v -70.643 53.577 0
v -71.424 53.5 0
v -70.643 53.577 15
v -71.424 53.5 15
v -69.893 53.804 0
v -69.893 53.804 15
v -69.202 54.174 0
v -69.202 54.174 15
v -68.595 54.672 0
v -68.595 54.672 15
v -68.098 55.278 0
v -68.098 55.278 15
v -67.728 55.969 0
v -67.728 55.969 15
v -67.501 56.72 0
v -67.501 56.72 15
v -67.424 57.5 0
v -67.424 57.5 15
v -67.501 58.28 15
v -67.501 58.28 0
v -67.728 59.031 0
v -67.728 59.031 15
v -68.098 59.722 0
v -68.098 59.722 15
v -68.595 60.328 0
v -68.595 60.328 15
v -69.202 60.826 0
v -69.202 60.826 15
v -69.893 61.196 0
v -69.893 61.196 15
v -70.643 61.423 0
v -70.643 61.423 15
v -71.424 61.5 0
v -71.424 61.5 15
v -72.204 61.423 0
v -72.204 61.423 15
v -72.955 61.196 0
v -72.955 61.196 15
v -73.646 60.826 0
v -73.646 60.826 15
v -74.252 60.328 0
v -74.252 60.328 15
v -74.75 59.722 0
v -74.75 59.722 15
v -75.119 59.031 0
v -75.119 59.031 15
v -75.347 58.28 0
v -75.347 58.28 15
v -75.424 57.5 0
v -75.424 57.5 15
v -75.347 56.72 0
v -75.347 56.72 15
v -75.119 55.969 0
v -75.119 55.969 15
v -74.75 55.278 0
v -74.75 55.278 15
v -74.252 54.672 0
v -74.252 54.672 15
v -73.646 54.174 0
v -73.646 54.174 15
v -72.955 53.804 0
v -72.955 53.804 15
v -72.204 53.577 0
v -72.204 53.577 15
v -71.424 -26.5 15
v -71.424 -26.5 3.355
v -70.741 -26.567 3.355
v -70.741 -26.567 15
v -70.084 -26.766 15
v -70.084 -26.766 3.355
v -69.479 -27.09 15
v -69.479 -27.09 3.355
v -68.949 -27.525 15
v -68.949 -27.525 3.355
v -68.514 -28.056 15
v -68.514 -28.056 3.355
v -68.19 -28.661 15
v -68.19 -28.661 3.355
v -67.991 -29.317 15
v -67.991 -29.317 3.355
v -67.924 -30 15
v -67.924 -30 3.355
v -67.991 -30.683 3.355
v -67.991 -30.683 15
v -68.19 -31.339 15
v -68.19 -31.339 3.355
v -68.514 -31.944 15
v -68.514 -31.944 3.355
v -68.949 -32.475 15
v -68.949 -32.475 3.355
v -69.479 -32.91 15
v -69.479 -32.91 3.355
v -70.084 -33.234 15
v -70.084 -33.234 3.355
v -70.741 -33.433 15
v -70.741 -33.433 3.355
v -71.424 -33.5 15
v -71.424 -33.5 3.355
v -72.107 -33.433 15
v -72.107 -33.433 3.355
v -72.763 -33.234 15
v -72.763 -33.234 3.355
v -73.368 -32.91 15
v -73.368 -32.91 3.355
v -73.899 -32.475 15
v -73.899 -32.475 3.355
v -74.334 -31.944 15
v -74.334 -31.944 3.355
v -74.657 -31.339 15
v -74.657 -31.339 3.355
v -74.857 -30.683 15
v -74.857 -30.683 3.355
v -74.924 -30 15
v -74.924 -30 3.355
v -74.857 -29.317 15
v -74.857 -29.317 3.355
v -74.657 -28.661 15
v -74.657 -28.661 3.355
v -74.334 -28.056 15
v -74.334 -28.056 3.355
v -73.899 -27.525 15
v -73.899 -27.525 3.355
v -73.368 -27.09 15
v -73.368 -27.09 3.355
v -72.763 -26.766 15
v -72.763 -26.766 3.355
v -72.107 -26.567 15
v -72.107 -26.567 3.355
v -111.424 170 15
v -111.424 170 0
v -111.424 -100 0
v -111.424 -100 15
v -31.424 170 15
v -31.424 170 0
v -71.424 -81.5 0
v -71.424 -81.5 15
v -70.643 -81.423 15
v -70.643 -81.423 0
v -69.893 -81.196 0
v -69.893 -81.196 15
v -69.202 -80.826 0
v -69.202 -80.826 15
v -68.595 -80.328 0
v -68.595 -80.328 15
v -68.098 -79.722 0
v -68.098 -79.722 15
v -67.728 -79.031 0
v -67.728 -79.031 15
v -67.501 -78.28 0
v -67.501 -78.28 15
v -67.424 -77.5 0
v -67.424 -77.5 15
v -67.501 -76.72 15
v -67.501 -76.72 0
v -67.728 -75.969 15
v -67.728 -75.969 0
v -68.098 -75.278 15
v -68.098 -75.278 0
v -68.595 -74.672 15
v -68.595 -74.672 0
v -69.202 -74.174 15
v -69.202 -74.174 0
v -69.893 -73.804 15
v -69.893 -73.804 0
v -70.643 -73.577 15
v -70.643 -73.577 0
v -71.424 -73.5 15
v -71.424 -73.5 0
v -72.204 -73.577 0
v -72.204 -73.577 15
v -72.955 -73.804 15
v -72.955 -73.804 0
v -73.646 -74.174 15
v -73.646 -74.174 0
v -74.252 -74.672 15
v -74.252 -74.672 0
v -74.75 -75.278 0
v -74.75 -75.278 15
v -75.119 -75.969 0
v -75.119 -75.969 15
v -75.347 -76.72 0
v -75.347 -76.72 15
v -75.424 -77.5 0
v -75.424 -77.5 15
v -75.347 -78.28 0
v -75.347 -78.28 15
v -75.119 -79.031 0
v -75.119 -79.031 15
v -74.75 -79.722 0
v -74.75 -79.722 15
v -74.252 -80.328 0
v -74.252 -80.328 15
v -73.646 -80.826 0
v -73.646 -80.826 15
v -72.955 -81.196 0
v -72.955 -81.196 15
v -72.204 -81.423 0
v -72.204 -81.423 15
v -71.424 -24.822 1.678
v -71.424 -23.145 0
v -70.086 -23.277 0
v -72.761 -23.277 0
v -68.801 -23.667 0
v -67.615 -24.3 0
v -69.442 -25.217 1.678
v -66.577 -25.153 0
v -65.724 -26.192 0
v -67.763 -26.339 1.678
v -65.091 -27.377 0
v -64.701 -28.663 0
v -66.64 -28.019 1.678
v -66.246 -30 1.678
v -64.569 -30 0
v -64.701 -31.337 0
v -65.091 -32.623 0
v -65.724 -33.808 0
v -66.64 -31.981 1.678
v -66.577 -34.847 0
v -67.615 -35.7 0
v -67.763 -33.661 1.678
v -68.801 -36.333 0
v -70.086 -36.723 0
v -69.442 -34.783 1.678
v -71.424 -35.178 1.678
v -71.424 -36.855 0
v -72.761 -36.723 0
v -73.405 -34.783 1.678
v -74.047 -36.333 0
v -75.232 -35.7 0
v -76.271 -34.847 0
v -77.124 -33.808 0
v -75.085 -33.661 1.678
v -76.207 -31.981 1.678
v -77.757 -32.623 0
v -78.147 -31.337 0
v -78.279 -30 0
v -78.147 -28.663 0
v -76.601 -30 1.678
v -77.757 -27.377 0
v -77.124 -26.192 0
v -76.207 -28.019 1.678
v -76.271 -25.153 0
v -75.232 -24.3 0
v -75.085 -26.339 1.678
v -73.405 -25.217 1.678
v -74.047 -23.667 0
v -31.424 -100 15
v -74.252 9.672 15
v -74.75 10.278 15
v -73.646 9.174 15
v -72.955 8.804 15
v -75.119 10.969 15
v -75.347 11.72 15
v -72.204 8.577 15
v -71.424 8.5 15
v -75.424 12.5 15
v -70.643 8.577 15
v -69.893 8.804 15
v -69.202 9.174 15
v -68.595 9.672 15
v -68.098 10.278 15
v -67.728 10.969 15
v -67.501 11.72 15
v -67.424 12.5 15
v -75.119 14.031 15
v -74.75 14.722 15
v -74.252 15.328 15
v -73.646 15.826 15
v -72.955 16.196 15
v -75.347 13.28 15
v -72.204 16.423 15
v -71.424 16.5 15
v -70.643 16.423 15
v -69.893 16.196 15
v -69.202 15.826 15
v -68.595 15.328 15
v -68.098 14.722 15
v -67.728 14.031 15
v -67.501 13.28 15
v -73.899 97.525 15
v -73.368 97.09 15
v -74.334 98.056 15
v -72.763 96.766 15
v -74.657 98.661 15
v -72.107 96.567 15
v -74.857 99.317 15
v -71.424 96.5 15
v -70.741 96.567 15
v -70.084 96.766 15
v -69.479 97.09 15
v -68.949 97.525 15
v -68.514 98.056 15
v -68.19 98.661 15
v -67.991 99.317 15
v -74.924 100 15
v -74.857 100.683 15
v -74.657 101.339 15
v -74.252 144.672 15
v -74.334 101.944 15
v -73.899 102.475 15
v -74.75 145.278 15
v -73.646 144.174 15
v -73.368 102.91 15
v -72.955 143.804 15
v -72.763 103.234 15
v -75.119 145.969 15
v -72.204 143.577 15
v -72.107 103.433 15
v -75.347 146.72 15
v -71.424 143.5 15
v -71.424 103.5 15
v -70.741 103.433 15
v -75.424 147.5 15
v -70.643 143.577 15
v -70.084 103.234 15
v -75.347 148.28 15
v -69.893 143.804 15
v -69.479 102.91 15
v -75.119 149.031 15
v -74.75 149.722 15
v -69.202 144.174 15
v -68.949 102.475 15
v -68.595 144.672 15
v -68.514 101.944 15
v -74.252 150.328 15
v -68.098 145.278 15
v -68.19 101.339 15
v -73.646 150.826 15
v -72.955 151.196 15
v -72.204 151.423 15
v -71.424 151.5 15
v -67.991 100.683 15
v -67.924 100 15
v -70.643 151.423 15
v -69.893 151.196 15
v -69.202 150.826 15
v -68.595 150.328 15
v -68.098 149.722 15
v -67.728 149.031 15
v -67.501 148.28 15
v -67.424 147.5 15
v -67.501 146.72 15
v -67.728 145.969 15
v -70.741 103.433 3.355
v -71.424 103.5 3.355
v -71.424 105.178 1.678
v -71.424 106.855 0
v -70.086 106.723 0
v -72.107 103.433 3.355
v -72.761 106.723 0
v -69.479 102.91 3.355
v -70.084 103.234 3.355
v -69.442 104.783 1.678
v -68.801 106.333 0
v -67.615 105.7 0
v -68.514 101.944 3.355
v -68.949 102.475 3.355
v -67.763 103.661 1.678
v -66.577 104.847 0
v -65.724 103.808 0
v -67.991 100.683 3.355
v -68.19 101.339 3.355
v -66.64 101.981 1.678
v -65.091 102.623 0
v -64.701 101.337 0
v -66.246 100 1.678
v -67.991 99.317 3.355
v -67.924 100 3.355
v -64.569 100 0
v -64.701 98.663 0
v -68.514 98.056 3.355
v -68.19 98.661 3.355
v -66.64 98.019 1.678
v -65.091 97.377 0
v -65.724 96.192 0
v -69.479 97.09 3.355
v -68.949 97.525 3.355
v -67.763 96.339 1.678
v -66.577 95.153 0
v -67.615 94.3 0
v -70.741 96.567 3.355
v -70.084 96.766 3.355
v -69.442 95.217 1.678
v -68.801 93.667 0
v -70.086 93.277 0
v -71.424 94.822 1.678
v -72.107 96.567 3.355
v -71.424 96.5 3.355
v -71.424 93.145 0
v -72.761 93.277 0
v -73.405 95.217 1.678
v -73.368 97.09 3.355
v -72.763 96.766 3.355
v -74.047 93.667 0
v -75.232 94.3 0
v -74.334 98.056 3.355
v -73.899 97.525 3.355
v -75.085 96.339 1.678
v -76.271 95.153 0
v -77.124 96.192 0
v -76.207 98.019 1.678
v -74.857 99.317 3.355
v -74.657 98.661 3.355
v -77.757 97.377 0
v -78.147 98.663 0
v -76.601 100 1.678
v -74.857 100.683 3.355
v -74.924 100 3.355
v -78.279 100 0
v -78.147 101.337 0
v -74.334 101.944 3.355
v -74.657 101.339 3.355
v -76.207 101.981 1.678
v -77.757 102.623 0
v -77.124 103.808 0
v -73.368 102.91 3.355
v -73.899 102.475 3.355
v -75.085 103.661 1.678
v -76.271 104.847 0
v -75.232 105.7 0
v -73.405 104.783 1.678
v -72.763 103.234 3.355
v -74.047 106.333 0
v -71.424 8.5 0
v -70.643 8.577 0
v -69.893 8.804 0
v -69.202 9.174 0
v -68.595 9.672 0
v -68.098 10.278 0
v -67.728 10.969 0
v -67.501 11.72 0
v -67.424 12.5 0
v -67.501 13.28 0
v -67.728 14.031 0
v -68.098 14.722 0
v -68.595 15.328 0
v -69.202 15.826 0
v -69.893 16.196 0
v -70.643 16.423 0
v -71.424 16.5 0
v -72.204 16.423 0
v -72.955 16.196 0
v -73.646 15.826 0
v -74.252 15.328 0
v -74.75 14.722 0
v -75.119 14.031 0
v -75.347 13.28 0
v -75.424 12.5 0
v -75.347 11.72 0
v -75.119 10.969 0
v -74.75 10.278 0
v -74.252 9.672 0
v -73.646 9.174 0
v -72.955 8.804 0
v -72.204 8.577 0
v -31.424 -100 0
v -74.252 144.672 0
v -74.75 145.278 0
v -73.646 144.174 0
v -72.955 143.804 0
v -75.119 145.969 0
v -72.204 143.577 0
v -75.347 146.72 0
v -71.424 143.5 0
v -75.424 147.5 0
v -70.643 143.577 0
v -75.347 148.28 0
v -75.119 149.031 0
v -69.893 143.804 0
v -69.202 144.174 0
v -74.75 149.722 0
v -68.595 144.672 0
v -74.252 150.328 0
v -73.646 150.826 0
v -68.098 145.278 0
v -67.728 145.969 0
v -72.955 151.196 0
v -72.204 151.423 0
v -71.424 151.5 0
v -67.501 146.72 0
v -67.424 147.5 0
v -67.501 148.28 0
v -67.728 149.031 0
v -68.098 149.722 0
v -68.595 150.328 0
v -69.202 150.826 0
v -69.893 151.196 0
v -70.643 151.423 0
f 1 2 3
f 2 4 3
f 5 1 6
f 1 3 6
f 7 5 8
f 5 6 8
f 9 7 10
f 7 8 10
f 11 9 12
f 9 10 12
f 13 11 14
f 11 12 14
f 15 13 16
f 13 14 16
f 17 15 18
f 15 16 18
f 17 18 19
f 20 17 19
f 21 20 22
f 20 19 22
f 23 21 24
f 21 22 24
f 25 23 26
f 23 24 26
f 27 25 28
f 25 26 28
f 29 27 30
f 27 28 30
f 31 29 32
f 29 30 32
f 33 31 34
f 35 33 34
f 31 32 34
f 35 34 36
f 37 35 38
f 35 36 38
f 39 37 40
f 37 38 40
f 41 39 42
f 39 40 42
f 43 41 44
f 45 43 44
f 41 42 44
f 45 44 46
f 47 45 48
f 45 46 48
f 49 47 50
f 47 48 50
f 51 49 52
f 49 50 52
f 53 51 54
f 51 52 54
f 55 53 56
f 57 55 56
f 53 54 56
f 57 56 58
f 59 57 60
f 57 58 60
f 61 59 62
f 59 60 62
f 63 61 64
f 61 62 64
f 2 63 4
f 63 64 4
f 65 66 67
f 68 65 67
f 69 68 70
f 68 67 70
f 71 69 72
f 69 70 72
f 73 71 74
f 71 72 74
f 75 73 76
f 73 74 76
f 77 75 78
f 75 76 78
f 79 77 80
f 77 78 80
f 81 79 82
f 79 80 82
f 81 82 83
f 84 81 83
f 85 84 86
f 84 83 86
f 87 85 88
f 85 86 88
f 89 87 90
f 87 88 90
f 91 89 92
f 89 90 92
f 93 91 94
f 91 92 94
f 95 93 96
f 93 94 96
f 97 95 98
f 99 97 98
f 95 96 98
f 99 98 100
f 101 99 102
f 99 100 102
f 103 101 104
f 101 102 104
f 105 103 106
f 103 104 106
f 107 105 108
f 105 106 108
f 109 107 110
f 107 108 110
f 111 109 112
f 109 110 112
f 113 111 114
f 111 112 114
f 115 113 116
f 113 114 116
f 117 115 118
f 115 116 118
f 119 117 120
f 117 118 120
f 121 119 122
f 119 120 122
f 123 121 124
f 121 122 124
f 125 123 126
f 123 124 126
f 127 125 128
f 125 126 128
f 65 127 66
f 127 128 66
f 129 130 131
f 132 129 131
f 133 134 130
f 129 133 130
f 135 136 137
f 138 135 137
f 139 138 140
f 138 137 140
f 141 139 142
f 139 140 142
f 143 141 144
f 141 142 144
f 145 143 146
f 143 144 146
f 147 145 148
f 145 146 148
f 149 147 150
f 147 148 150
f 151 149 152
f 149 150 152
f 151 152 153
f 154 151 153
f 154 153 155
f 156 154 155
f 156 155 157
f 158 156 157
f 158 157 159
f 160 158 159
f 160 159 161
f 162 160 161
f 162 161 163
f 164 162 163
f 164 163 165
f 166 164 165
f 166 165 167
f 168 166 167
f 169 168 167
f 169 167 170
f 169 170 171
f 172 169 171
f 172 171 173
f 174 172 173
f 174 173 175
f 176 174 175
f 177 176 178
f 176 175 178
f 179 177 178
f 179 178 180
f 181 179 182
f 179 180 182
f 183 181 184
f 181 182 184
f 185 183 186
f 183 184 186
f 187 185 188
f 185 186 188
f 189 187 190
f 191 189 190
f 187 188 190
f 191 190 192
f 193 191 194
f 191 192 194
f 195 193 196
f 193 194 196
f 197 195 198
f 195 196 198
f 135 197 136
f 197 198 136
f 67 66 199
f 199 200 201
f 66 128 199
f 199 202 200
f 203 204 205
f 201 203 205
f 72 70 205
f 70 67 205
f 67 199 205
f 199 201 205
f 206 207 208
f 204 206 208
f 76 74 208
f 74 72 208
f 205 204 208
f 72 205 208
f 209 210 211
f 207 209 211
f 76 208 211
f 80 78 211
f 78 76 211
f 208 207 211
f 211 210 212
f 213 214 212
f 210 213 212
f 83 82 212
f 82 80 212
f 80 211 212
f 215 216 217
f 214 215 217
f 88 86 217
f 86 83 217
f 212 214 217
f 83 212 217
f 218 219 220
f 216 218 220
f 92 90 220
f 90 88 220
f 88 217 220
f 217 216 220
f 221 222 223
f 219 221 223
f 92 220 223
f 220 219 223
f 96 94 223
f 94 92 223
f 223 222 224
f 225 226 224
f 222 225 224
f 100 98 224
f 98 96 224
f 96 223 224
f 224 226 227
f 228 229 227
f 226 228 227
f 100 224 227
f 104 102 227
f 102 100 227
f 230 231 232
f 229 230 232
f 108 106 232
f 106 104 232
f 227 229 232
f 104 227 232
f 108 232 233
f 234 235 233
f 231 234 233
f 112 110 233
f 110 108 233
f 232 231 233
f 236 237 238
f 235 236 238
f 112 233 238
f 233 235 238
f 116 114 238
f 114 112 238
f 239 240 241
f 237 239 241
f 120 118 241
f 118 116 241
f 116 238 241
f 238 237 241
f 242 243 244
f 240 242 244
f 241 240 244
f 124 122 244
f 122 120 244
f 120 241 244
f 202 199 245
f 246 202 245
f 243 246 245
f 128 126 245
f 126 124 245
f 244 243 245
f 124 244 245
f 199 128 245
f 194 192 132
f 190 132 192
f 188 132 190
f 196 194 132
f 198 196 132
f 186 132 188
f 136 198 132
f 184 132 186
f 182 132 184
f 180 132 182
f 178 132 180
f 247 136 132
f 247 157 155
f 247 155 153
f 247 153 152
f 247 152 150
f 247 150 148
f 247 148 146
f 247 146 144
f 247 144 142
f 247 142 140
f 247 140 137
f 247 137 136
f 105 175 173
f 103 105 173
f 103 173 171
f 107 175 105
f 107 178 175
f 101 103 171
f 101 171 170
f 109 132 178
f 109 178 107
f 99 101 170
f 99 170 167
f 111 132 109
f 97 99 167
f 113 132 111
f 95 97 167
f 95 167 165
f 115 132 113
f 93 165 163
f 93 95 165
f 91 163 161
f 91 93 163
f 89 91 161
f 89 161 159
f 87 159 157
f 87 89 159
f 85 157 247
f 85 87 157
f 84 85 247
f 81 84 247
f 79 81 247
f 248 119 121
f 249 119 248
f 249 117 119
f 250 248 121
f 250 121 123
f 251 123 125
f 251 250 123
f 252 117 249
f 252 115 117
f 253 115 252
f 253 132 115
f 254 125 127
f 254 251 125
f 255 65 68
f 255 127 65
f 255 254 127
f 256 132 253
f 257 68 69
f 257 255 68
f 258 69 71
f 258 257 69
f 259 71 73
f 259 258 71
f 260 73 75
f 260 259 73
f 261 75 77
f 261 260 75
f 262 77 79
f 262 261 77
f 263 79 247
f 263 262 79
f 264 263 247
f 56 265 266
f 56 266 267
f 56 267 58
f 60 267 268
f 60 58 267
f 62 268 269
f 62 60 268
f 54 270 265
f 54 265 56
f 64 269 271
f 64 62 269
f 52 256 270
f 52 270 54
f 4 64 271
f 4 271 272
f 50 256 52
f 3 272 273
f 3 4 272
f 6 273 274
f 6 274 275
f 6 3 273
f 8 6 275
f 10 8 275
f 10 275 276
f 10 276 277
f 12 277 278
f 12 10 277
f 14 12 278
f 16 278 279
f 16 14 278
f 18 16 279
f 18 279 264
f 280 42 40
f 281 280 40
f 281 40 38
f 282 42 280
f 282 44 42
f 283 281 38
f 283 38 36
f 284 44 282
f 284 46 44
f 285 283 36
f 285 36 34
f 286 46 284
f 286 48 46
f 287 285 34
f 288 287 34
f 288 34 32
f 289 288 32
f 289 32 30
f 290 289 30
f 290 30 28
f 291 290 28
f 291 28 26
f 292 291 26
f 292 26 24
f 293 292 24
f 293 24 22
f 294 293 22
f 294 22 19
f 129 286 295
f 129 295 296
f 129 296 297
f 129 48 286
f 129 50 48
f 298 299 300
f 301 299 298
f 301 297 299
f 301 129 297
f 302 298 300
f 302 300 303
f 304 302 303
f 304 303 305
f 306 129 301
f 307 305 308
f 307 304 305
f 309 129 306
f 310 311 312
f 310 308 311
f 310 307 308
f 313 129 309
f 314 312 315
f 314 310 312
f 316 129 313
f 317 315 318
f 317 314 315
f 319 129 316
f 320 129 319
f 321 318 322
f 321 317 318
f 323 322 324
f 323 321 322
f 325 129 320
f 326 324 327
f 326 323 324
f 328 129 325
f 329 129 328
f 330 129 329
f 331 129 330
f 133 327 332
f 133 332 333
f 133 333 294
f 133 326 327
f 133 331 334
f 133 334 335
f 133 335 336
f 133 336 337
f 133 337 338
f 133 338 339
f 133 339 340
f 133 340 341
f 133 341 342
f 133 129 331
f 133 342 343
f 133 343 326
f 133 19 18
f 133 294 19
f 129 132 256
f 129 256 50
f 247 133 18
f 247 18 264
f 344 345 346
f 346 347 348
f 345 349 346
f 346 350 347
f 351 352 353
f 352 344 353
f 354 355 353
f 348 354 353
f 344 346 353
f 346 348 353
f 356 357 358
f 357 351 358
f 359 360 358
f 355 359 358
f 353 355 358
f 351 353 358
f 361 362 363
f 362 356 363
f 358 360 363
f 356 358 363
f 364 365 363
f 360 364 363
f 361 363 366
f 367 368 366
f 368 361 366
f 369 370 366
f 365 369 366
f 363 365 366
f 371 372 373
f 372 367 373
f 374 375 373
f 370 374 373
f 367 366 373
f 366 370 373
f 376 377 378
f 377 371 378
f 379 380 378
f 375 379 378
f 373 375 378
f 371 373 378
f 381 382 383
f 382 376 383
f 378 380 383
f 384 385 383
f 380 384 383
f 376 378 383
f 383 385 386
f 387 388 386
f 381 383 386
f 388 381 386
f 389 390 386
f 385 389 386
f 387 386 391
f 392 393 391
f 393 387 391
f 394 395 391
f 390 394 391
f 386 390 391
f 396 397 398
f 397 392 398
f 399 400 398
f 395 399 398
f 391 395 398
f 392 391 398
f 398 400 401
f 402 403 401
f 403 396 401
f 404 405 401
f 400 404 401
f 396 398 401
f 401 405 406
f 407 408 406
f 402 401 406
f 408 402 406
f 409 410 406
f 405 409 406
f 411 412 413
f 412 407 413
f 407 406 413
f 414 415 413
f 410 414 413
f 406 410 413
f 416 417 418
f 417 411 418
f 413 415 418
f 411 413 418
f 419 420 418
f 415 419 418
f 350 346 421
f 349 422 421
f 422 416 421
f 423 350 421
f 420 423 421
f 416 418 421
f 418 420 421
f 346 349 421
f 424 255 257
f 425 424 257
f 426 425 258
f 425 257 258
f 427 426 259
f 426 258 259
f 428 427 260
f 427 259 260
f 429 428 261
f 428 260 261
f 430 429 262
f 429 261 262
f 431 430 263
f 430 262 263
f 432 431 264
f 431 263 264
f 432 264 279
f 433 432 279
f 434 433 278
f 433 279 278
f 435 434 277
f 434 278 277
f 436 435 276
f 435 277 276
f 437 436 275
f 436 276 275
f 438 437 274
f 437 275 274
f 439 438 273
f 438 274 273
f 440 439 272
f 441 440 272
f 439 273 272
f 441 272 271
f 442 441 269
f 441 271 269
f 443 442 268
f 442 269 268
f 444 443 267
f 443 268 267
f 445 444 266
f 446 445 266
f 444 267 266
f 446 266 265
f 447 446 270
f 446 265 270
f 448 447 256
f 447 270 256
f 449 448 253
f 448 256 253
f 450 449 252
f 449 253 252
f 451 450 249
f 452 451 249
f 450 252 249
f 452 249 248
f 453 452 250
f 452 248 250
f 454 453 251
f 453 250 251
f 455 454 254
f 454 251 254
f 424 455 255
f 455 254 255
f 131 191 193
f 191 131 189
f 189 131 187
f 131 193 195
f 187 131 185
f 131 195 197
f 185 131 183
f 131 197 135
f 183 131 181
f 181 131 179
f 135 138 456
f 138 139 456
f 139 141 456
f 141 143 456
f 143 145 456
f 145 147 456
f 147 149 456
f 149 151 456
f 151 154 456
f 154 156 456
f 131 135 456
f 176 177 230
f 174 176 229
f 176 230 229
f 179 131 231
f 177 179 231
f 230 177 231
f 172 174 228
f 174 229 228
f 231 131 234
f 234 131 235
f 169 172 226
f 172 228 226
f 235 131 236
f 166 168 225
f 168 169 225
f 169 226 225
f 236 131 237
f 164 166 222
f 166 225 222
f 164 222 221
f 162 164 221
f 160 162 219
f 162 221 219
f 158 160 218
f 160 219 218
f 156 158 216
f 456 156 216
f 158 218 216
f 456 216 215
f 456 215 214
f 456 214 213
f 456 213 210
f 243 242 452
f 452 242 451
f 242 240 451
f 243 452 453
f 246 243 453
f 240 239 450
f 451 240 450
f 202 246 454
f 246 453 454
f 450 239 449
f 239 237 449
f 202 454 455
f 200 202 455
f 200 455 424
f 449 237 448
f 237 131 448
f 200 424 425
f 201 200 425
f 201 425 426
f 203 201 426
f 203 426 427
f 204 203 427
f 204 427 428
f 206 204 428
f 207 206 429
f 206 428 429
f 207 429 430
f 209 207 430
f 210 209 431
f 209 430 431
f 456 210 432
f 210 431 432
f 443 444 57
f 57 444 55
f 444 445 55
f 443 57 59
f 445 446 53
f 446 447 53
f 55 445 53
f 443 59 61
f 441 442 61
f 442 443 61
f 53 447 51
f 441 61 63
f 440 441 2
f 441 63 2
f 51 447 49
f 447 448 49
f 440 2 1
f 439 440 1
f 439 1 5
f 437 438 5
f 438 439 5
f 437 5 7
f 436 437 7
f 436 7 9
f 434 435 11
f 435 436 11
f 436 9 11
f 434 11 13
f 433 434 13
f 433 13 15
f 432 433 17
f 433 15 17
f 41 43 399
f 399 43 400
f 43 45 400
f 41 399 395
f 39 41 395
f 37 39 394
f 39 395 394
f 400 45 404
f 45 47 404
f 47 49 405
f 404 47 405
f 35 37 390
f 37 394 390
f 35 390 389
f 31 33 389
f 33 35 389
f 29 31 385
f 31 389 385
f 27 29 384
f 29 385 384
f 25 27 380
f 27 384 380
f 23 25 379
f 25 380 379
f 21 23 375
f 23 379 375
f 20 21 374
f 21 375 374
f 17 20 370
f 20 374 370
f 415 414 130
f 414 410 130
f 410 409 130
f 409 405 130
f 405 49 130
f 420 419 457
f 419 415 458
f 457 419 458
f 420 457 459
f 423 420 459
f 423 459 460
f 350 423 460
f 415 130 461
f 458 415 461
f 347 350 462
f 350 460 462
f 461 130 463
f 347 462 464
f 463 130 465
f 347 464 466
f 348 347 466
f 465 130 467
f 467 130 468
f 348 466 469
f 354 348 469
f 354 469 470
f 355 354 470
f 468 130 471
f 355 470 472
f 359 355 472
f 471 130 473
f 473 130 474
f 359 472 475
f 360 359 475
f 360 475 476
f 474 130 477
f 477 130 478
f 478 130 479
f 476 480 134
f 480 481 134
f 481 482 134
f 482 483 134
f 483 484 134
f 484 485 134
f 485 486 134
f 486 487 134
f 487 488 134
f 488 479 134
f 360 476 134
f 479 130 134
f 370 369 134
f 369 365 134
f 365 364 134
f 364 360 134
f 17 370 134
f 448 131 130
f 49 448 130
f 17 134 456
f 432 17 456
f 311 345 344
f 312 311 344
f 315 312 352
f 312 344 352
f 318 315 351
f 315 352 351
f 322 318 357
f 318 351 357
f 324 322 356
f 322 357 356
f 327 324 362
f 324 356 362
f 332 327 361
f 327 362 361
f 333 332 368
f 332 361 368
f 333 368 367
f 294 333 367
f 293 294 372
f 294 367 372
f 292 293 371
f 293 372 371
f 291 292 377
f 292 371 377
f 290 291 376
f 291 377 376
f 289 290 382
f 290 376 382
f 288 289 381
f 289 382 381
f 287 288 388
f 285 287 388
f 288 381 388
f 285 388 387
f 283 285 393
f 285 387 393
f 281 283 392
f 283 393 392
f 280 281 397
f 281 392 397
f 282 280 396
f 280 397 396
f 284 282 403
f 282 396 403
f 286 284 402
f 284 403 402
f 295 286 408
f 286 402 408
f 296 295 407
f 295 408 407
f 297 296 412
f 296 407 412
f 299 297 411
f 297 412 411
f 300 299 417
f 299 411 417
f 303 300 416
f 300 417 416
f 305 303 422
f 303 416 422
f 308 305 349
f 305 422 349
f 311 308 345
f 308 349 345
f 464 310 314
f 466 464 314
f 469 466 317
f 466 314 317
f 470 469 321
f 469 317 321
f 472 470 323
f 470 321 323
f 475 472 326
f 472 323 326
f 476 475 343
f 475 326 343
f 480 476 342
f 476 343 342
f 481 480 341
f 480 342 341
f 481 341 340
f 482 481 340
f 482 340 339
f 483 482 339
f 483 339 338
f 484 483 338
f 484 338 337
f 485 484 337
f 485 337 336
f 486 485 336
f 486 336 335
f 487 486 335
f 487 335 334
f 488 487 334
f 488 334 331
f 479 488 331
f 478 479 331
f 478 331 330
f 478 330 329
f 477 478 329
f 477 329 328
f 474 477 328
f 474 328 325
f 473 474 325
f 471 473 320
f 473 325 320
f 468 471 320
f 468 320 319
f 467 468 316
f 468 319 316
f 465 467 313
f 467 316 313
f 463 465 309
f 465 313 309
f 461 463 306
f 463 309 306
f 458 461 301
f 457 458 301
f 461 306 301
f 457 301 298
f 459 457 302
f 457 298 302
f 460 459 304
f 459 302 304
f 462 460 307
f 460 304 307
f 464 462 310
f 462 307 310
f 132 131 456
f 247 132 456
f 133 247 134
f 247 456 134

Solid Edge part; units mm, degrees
sketch "Sketch1" plane through (0, 0, 0) normal (0, 0, 1) x (1, 0, 0)
  line L0 (-111.4238, -100) -> (-31.4238, -100)
  line L1 (-31.4238, -100) -> (-31.4238, 170)
  line L2 (-31.4238, 170) -> (-111.4238, 170)
  line L3 (-111.4238, 170) -> (-111.4238, -100)
  dimension "D1" = 80
  dimension "D2" = 270
extrude "Protrusion1" add sketch "Sketch1" along normal blind 15
hole "Agujero_1" at (-71.4238, 100, 0) direction (0, 0, 1) diameter 7 end up to next countersink diameter 13.71 countersink angle 90
hole "Hole1" at (-71.4238, -30, 0) direction (0, 0, 1) diameter 7 end up to next countersink diameter 13.71 countersink angle 90
hole "Agujero_5" at (-71.4238, -77.5, 15) direction (0, 0, -1) diameter 8 end up to next
hole "Hole2" at (-71.4238, 12.5, 15) direction (0, 0, -1) diameter 8 end up to next
hole "Hole3" at (-71.4238, 57.5, 15) direction (0, 0, -1) diameter 8 end up to next
hole "Hole4" at (-71.4238, 147.5, 15) direction (0, 0, -1) diameter 8 end up to next
properties part number "1983-1100-001"
